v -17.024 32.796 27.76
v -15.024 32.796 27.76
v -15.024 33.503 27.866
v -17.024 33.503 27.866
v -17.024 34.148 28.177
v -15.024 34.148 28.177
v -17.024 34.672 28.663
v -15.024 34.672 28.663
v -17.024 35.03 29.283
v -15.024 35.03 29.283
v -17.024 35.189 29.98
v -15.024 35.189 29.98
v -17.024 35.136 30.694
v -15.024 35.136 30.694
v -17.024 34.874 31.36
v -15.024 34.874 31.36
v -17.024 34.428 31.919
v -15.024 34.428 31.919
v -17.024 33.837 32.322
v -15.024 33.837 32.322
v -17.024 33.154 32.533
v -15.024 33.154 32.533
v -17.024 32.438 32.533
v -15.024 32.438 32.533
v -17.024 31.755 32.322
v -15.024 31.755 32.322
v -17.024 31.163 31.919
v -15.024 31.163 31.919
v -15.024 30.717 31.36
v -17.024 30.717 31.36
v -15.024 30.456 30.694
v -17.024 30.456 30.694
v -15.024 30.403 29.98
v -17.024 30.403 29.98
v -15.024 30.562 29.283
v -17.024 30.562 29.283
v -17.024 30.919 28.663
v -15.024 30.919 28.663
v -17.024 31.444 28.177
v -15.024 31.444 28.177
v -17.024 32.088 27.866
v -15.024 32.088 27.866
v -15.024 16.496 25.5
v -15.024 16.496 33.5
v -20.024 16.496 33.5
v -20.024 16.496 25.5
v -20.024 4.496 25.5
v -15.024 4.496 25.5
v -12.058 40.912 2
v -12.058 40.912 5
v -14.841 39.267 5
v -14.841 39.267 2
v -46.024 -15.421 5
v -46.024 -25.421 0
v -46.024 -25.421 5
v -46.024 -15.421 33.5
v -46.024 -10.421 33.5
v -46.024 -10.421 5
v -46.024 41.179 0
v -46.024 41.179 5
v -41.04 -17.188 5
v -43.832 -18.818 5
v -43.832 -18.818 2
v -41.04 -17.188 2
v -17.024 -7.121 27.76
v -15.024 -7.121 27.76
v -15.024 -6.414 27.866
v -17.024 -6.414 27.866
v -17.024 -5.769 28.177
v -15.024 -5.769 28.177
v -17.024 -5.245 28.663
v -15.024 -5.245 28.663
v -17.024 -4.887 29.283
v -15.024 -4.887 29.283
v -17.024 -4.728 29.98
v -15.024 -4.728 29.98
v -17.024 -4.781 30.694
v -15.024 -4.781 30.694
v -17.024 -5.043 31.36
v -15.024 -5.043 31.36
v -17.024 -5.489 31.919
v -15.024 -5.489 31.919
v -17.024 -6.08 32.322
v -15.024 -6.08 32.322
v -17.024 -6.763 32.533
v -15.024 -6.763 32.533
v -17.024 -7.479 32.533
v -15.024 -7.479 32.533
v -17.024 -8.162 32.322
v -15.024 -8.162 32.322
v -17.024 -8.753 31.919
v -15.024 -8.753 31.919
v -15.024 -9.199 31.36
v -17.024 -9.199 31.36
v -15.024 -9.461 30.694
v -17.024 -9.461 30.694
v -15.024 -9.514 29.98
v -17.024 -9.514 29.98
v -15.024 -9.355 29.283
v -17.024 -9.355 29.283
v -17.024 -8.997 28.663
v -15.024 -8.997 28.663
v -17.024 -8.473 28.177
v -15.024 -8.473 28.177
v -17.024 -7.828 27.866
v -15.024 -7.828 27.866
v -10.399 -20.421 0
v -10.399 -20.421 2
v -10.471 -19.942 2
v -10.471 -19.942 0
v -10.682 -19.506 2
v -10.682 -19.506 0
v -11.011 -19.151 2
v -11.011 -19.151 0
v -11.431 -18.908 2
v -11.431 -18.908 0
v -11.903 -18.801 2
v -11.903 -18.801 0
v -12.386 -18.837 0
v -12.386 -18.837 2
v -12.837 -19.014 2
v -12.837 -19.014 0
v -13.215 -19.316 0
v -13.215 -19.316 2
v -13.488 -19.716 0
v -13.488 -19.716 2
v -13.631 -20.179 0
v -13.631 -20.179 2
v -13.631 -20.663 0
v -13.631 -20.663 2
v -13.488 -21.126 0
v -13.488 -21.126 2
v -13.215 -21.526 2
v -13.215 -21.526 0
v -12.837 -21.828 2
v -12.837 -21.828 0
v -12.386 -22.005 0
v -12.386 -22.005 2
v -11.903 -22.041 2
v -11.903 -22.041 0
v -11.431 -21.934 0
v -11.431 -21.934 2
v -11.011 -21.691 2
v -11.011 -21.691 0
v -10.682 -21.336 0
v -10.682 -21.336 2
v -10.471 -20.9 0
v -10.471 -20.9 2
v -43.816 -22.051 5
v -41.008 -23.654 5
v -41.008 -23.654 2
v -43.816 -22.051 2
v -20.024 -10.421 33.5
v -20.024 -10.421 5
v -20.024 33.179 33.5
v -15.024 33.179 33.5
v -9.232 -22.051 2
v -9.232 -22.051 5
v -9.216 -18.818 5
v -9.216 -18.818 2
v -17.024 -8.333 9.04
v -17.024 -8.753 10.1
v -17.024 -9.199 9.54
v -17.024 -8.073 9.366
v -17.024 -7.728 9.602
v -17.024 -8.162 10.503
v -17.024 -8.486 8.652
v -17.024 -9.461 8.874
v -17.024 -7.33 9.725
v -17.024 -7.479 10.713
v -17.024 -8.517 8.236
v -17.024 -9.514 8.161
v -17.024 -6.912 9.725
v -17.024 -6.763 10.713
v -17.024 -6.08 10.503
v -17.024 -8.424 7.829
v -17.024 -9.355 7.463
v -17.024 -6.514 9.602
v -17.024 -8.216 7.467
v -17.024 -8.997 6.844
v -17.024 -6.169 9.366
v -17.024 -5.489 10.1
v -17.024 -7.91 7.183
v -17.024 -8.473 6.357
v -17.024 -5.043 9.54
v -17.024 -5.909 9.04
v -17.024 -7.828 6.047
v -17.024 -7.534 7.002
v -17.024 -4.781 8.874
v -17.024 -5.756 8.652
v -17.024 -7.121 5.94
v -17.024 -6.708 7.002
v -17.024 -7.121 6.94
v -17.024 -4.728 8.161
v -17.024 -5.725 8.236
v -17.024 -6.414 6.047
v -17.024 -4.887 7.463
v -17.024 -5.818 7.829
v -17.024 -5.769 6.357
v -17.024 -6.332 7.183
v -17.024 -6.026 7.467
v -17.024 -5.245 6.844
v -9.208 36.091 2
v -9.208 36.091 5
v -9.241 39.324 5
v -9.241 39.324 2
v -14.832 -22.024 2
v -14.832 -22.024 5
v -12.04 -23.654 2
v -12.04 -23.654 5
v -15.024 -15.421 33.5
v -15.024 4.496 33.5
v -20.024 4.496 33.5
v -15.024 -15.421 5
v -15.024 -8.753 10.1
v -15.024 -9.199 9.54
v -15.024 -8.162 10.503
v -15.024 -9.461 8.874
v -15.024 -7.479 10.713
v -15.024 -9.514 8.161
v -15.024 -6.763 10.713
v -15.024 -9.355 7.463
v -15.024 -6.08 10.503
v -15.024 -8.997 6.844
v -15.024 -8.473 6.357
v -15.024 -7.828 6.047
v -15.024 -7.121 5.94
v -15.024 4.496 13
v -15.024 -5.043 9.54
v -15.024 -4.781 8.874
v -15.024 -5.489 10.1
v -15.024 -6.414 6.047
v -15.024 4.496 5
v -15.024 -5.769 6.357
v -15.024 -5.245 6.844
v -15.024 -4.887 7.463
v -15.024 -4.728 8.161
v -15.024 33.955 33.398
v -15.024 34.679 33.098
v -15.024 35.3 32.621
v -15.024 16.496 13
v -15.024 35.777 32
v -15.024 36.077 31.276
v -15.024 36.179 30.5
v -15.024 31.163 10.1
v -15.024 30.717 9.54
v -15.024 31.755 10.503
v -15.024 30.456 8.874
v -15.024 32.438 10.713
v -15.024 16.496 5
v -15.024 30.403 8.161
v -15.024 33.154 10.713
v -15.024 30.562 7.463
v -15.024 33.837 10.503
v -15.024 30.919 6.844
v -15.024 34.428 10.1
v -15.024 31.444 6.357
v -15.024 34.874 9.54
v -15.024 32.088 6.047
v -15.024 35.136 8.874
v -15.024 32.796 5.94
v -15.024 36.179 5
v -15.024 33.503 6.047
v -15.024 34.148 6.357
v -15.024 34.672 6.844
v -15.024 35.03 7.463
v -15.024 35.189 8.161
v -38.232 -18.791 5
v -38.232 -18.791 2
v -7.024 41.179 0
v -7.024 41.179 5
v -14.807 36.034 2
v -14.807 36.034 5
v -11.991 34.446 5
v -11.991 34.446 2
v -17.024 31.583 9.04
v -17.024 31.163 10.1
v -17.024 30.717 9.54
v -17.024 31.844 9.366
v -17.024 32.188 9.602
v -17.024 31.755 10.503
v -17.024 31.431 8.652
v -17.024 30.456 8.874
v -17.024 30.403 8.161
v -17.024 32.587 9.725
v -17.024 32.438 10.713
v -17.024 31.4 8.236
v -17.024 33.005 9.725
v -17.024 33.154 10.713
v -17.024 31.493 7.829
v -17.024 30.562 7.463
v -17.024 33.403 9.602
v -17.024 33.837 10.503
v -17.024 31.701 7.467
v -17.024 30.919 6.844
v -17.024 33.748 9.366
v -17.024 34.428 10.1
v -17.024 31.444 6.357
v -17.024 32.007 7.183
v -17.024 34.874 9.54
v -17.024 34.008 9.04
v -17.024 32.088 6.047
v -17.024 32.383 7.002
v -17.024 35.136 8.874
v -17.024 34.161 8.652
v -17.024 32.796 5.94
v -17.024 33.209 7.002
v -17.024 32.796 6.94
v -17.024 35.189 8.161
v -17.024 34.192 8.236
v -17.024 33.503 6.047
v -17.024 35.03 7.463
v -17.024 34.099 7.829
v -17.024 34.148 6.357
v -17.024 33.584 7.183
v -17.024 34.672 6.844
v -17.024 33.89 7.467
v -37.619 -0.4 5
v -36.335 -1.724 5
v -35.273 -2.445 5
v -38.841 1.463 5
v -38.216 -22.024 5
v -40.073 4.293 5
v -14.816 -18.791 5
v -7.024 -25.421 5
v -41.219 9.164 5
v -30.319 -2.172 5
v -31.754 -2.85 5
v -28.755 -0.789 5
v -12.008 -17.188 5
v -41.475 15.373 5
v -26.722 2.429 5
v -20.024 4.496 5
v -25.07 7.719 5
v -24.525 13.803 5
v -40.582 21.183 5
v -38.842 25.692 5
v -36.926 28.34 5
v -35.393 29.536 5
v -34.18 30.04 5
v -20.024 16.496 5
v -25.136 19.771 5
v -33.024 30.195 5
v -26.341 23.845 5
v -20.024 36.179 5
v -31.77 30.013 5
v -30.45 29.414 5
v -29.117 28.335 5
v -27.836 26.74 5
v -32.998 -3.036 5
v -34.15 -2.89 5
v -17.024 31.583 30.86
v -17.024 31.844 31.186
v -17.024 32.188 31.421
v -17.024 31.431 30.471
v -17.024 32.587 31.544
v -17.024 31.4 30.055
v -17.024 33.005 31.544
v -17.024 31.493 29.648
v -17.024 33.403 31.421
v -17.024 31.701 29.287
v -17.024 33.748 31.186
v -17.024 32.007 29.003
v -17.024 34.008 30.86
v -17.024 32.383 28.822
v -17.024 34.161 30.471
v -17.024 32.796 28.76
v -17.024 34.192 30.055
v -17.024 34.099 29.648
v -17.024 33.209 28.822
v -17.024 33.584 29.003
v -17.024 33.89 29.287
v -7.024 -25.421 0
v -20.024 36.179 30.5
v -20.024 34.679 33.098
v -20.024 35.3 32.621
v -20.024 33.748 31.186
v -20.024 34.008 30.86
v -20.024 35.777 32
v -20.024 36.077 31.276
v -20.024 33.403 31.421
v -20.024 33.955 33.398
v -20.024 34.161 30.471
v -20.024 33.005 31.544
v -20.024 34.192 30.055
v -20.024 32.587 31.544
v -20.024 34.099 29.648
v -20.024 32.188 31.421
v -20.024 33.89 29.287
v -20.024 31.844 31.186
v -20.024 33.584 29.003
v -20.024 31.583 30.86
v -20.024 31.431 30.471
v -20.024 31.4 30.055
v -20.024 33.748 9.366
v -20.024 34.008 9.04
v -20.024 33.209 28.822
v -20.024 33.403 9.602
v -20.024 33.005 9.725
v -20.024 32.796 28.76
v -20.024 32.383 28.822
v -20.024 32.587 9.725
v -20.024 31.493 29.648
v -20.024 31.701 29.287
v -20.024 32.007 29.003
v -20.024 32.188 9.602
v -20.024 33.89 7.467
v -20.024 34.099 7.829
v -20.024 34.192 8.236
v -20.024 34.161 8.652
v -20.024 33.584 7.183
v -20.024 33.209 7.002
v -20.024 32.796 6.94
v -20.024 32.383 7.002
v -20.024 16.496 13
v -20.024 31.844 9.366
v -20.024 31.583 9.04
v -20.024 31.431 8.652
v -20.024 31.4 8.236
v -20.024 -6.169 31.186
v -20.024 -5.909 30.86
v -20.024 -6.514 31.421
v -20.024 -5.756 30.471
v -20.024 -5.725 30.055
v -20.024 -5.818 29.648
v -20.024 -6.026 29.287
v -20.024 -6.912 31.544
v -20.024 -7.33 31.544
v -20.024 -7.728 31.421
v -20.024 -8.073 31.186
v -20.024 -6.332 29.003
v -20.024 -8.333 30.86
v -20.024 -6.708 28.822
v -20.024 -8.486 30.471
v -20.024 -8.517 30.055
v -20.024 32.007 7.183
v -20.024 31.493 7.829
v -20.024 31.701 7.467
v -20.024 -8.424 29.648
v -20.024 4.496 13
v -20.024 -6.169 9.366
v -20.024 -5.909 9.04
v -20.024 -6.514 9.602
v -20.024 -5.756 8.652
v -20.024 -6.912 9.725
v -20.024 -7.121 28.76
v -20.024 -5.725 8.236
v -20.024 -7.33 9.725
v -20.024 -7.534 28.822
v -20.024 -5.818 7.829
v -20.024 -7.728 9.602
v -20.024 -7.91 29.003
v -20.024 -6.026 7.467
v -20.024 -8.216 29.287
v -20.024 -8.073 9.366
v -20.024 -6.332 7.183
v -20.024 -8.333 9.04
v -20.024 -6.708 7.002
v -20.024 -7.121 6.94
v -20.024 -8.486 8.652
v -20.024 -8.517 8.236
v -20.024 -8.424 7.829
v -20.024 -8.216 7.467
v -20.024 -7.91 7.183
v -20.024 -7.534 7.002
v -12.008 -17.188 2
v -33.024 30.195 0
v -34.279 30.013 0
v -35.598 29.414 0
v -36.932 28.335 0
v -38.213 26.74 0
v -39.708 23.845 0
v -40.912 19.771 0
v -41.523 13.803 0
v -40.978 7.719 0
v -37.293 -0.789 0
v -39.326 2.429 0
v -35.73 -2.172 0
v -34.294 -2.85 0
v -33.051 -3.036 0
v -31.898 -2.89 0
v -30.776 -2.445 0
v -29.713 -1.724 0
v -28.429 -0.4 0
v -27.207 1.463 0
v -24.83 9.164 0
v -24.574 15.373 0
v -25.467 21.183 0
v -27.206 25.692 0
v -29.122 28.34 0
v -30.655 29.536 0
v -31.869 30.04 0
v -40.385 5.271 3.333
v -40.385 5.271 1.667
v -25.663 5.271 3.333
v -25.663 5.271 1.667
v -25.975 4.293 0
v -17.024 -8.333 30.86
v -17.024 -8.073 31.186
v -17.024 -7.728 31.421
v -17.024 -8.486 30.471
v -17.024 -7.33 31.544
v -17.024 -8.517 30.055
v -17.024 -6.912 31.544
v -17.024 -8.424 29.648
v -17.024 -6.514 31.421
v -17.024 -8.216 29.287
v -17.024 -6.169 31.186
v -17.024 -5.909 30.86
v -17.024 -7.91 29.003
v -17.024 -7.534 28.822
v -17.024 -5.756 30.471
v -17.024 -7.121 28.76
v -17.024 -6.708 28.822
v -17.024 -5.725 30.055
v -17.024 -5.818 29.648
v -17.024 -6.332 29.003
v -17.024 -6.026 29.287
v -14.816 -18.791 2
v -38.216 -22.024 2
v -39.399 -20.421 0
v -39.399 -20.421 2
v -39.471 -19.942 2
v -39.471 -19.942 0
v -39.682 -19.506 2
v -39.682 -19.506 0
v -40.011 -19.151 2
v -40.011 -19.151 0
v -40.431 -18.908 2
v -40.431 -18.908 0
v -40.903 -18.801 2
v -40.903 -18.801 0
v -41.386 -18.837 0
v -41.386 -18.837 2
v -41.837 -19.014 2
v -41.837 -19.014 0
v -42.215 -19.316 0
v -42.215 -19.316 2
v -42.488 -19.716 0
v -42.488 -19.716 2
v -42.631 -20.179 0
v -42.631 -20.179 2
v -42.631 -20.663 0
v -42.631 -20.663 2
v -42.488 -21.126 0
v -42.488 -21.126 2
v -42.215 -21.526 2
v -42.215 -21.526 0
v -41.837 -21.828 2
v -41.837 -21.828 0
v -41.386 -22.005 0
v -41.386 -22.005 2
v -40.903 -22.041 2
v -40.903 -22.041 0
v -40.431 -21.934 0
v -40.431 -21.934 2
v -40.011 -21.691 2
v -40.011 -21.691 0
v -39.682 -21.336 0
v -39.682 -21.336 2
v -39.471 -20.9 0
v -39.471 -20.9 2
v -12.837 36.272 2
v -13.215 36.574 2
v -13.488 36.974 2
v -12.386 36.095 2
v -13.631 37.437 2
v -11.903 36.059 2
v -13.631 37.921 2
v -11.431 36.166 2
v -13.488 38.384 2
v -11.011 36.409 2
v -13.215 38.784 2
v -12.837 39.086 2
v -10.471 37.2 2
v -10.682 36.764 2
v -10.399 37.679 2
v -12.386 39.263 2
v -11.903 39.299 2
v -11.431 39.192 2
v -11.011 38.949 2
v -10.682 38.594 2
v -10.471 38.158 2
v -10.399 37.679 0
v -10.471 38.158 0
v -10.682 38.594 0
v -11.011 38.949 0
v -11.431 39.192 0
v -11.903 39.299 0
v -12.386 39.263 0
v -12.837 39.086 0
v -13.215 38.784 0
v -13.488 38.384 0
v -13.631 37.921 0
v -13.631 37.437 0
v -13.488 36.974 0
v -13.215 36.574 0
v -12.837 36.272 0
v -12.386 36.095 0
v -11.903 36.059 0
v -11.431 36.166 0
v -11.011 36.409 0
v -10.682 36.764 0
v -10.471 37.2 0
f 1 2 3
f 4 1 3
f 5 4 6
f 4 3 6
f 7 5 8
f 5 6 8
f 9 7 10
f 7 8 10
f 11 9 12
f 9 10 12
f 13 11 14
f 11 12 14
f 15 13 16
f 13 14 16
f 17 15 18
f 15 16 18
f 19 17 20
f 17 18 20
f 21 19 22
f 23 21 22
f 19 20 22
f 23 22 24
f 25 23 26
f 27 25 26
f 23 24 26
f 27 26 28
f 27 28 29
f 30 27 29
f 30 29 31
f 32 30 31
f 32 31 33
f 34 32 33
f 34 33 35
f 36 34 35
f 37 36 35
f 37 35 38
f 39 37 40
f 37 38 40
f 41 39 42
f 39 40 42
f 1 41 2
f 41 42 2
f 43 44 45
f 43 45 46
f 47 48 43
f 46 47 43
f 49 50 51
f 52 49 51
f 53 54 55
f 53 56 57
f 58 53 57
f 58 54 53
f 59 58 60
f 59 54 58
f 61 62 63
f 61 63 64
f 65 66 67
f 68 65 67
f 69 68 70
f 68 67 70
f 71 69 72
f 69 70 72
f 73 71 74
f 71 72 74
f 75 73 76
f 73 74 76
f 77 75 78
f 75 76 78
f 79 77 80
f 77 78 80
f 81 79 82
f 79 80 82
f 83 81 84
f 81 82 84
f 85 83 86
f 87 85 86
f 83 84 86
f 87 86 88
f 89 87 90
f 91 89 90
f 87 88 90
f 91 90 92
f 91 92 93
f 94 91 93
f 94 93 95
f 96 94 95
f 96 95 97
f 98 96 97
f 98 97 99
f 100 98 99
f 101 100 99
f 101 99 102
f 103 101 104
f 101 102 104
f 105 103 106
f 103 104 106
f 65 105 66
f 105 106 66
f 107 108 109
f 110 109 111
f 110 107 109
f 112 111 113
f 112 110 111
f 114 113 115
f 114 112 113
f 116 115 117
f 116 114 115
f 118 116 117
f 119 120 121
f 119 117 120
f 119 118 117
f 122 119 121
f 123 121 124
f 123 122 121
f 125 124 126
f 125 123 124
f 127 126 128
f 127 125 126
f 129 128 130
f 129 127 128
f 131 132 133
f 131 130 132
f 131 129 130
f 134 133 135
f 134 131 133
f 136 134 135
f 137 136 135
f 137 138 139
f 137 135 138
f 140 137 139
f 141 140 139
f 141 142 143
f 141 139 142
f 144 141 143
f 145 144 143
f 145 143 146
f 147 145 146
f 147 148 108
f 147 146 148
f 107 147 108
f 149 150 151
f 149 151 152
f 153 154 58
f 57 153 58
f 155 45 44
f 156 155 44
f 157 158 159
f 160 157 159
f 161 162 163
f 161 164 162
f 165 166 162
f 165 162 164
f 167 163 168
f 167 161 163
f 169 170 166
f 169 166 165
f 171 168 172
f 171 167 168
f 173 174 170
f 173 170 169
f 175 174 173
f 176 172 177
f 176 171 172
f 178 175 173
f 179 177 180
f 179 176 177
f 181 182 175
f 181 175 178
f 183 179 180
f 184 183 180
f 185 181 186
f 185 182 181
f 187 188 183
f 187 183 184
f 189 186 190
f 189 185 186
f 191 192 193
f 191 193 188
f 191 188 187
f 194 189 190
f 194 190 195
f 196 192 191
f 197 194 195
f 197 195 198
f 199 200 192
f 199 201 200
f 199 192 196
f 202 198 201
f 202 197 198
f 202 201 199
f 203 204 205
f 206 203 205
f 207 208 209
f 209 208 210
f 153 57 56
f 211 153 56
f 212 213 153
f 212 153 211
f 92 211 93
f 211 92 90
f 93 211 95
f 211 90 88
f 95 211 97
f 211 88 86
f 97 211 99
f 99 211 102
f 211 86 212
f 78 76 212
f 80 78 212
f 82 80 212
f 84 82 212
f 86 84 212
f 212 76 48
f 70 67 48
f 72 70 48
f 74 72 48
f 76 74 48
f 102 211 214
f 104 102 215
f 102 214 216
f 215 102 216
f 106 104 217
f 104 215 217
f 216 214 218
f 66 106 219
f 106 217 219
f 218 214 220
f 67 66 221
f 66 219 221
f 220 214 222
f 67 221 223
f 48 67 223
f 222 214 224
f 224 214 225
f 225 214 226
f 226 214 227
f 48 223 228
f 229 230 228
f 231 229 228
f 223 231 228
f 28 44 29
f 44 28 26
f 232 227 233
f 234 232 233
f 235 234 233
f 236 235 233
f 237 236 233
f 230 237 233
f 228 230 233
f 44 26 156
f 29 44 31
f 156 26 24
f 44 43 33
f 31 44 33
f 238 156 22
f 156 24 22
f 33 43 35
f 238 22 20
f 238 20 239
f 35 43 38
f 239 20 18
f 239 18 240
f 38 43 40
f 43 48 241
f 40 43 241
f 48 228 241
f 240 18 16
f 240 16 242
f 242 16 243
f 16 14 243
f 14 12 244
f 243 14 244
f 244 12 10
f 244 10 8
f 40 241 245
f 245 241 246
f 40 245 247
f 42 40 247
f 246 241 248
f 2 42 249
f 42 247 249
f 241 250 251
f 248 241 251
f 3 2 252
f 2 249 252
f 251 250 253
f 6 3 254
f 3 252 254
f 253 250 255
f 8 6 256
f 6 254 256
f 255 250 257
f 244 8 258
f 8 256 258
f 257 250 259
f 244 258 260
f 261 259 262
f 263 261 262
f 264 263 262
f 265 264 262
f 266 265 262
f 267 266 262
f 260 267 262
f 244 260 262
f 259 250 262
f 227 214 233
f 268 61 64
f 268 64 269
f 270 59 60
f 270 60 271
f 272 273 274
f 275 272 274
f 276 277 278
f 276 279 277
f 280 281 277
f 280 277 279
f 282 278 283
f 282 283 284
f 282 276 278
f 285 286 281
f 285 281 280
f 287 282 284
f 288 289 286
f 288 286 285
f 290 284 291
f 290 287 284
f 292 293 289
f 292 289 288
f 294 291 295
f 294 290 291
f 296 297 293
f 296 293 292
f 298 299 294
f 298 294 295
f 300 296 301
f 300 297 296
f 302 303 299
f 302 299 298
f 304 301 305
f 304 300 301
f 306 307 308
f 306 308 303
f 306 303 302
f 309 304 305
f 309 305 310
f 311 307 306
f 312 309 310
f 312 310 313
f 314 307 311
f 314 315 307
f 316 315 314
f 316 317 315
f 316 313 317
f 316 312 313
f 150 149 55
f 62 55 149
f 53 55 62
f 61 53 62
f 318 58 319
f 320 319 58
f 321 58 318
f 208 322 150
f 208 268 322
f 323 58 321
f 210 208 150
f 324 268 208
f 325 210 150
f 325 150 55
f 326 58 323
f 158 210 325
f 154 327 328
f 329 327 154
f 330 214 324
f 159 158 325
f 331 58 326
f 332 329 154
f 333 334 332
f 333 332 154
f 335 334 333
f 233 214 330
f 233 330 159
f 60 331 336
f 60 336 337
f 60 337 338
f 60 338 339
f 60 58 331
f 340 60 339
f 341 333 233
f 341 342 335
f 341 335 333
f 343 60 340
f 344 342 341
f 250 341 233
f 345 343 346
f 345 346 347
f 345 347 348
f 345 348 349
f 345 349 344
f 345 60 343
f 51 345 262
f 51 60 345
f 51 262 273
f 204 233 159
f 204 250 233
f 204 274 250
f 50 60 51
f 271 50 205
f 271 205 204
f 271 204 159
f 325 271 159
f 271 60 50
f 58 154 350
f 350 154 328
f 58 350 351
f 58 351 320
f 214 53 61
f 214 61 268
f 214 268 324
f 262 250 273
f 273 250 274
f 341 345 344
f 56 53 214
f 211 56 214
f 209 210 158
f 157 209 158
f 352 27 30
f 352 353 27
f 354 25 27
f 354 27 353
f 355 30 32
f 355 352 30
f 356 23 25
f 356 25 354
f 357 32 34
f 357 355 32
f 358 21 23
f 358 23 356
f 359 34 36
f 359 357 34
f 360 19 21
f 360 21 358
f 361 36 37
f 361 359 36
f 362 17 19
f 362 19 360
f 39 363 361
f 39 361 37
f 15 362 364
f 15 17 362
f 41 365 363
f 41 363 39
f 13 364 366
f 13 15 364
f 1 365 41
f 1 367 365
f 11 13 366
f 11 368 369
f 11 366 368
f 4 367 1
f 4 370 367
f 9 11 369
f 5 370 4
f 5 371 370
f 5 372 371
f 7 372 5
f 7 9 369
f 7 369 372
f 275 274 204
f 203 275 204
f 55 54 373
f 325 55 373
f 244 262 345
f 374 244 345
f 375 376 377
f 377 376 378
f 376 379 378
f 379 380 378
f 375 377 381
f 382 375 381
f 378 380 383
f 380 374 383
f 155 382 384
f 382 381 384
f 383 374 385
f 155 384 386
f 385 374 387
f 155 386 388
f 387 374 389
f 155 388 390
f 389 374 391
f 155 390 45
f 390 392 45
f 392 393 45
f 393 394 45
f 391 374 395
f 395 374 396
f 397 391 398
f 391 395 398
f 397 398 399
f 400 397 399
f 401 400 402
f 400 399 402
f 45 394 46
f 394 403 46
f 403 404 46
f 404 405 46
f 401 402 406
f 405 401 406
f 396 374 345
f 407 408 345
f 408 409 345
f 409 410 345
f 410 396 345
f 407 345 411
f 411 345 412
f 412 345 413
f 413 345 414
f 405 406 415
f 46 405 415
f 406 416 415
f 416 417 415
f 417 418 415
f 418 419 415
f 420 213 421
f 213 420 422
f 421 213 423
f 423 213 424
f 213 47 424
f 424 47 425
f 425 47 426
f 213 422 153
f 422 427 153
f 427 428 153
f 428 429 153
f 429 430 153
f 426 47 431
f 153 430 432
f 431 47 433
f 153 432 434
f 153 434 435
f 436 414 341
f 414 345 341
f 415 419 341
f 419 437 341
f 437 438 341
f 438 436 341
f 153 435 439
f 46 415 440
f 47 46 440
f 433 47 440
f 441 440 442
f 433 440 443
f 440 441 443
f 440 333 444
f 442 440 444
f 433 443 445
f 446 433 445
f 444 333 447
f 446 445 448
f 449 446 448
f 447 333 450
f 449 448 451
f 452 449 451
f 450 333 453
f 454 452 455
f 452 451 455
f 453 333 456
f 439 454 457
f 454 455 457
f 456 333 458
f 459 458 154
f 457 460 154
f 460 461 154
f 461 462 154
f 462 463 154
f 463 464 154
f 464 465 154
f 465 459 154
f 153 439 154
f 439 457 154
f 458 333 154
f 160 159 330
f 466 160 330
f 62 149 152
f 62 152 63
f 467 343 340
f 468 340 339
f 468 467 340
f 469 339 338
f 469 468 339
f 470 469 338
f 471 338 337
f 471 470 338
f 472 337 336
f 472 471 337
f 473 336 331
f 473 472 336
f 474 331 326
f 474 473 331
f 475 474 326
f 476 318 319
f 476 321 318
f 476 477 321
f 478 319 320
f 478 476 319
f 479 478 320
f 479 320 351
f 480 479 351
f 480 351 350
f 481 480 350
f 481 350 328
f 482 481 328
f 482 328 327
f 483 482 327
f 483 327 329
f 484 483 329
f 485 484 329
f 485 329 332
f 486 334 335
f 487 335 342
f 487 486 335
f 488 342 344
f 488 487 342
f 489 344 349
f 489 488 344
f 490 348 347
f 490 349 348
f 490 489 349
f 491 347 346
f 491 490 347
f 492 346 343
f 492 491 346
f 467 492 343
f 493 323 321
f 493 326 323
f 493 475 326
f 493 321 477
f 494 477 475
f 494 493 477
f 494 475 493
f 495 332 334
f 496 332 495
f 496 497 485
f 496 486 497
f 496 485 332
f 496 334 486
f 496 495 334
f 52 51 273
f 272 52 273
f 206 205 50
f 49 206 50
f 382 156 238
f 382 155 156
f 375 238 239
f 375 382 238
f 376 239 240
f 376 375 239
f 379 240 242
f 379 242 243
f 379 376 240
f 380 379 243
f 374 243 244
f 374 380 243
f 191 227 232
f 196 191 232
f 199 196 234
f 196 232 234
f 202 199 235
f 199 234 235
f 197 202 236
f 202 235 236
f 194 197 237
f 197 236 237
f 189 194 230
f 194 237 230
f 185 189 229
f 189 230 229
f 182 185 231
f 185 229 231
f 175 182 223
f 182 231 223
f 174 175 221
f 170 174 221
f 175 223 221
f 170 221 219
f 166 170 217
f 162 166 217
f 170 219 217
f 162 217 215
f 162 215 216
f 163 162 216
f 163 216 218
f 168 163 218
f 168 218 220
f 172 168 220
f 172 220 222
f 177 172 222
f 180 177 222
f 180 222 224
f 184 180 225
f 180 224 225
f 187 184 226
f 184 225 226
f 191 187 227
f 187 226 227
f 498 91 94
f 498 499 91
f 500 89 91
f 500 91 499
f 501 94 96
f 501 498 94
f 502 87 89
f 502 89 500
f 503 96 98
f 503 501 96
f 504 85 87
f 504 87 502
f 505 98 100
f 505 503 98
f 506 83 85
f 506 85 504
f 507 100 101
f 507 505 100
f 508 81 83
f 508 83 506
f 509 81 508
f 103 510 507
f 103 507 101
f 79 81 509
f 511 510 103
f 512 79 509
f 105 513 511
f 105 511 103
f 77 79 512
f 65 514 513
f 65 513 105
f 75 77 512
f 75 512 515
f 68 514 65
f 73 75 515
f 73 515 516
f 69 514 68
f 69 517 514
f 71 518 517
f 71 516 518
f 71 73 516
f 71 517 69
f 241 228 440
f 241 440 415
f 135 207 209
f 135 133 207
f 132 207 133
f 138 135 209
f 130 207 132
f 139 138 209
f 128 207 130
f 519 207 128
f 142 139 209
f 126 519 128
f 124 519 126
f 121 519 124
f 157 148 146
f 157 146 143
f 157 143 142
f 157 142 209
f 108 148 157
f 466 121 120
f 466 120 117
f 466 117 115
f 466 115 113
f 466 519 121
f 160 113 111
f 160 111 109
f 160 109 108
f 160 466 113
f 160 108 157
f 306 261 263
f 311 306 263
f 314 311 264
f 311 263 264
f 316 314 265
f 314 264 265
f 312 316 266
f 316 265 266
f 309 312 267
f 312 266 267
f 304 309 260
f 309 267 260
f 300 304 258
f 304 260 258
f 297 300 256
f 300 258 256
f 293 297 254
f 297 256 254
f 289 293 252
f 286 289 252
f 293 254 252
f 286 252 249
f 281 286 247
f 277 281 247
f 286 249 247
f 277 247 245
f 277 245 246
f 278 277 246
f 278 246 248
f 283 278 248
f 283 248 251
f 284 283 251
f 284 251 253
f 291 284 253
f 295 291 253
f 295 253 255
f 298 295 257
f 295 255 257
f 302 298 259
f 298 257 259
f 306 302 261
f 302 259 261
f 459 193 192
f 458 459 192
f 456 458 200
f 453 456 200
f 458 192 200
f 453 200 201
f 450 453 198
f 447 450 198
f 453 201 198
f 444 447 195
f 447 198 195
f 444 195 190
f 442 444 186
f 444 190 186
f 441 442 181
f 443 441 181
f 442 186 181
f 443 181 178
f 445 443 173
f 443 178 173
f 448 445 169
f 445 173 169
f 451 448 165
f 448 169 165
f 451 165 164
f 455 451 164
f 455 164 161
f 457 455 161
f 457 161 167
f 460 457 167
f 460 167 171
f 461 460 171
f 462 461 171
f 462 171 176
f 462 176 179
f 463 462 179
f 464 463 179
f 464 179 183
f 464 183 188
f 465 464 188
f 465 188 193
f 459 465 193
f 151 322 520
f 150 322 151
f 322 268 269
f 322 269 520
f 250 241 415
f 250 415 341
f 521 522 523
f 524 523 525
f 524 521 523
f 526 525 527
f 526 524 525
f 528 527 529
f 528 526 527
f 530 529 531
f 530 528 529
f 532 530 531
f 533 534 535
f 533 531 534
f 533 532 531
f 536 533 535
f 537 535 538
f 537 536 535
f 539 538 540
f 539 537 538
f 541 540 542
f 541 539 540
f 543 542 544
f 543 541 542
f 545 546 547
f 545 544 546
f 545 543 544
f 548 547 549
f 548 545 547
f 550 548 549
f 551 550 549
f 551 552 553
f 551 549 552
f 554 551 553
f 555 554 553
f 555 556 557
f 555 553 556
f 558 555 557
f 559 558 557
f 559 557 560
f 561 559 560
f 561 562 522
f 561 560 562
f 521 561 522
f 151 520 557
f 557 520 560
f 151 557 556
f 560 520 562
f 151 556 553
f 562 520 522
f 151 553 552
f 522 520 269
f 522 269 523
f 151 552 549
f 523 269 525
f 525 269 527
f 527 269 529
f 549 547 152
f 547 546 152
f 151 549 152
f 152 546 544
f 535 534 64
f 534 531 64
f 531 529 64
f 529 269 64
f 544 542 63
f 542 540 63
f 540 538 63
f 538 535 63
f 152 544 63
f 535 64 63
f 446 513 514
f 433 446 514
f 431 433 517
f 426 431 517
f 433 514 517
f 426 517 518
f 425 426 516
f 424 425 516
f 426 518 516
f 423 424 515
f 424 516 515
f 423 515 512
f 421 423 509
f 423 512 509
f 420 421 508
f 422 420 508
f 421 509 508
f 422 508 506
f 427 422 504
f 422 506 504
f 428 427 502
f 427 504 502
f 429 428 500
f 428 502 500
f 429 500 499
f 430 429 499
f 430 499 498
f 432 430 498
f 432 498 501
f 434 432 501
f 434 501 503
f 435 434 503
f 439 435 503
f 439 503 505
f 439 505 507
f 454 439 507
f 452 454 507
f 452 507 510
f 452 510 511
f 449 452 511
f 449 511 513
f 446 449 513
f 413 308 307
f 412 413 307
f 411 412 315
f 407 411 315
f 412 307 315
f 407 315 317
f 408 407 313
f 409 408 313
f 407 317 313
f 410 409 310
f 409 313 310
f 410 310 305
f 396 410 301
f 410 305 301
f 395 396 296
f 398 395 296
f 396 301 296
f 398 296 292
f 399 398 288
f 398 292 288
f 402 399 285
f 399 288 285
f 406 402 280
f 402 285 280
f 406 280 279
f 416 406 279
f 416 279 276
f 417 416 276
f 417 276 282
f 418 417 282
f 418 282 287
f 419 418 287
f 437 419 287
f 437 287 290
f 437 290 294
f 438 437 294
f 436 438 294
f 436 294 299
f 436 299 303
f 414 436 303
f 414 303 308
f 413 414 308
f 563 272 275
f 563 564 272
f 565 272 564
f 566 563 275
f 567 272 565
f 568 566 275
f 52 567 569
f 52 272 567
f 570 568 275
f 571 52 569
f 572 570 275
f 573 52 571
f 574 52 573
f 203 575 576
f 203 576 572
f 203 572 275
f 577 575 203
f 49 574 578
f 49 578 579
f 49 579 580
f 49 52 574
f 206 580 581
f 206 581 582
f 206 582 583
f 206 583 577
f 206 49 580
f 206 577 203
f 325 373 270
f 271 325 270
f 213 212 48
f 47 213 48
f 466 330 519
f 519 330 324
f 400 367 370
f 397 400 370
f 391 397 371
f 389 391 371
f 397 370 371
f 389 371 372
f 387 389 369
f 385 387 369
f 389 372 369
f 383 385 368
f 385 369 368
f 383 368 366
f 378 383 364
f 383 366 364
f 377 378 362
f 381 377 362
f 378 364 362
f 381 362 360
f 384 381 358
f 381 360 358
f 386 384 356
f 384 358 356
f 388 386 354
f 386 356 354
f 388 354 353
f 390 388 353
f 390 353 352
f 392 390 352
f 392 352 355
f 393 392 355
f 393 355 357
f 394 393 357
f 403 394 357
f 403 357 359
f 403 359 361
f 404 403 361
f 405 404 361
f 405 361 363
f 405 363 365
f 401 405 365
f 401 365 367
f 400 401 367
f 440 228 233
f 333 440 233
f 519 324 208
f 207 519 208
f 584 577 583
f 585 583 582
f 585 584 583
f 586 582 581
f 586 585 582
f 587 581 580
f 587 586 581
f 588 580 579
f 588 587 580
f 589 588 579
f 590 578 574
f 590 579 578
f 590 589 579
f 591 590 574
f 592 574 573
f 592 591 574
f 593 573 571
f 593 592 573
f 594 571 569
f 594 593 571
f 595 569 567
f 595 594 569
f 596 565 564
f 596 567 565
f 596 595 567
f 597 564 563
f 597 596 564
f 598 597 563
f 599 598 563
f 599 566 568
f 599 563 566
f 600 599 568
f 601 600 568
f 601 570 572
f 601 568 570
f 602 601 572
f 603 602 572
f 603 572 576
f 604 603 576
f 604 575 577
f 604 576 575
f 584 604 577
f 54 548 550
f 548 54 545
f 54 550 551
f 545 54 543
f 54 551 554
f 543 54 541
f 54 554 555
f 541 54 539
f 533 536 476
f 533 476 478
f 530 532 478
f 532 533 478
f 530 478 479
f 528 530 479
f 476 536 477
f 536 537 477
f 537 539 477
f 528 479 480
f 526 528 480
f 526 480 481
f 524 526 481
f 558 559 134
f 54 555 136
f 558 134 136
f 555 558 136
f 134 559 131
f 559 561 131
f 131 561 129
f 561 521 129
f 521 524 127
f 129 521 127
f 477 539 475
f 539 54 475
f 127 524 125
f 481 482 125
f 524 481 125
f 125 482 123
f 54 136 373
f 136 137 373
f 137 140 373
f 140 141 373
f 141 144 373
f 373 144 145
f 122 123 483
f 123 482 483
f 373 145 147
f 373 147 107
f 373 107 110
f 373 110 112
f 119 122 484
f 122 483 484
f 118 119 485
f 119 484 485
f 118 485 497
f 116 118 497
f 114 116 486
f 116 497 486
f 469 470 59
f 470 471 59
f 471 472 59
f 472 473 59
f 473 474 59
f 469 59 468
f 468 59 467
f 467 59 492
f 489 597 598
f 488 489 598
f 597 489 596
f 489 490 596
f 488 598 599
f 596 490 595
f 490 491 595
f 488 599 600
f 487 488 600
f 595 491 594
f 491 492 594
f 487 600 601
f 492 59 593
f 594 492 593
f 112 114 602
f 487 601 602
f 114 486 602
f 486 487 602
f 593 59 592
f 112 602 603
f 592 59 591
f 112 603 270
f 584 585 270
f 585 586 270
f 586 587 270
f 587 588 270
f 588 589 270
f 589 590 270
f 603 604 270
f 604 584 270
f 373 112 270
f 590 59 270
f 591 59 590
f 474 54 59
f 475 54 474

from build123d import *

# Parameters (mm, degrees)
SKETCH1_W           = 39
SKETCH1_H           = 66.6
SKETCH1_R           = 1.625
BOSS_EXTRUDE1_DEPTH = 5
BOSS_EXTRUDE3_DEPTH = 33.5
CUT_EXTRUDE5_START  = 5
CUT_EXTRUDE5_DEPTH  = 3
FILLET1_R           = 3
SKETCH3_R           = 1.4
SKETCH3_W           = 8
SKETCH3_H           = 12
CUT_EXTRUDE6_DEPTH  = 62.473243338
SKETCH3_3_R         = 2.4
SKETCH3_3_R_2       = 1.4
CUT_EXTRUDE7_DEPTH  = 2


with BuildPart() as part:
    # Sketch1 → Boss-Extrude1 (new body)
    with BuildSketch(Plane.XY):
        with Locations((-26.524184287, 7.878995035)):
            Rectangle(SKETCH1_W, SKETCH1_H)
        with Locations((-12.024184287, -20.421004965)):
            Circle(SKETCH1_R, mode=Mode.SUBTRACT)
        with BuildLine():
            add(Edge.make_bspline(
                [(-33.024184287, 30.194508602), (-47.746616151, 30.194508602), (-40.385400219, 5.271238252), (-33.024184287, -19.652032099), (-25.662968354, 5.271238252), (-18.301752422, 30.194508602), (-33.024184287, 30.194508602)],
                knots=[0, 0, 0, 2.094395102, 2.094395102, 4.188790205, 4.188790205, 6.283185307, 6.283185307, 6.283185307], degree=2, weights=[1, 0.5, 1, 0.5, 1, 0.5, 1]))
        make_face(mode=Mode.SUBTRACT)
        with Locations((-12.024184287, 37.678995035)):
            Circle(SKETCH1_R, mode=Mode.SUBTRACT)
        with Locations((-41.024184287, -20.421004965)):
            Circle(SKETCH1_R, mode=Mode.SUBTRACT)
    extrude(amount=BOSS_EXTRUDE1_DEPTH)

    # Sketch1<3> → Boss-Extrude3 (add)
    with BuildSketch(Plane.XY):
        Polygon((-20.024184287, -10.421004965), (-46.024184287, -10.421004965), (-46.024184287, -12.421004965), (-46.024184287, -15.421004965), (-15.024184287, -15.421004965), (-15.024184287, 36.178995035), (-20.024184287, 36.178995035), align=None)
    extrude(amount=BOSS_EXTRUDE3_DEPTH)

    # Sketch1<6> → Cut-Extrude5 (cut)
    with BuildSketch(Plane.XY.offset(CUT_EXTRUDE5_START)):
        Polygon((-41.008426388, -23.654128071), (-43.816272081, -22.051213259), (-43.83202998, -18.818090152), (-41.039942185, -17.187881858), (-38.232096492, -18.790796671), (-38.216338594, -22.023919778), align=None)
        Polygon((-14.840760077, 39.266519571), (-14.807308759, 36.033531117), (-11.990732969, 34.446006581), (-9.207608497, 36.091470499), (-9.241059814, 39.324458953), (-12.057635604, 40.911983489), align=None)
        Polygon((-9.232096492, -22.051213259), (-9.216338594, -18.818090152), (-12.008426388, -17.187881858), (-14.816272081, -18.790796671), (-14.83202998, -22.023919778), (-12.039942185, -23.654128071), align=None)
    extrude(amount=-CUT_EXTRUDE5_DEPTH, mode=Mode.SUBTRACT)

    # Fillet1
    fillet1_edges = [part.edges().sort_by_distance(p)[0] for p in [
        (-17.524184287, 36.178995035, 33.5),
    ]]
    fillet(fillet1_edges, radius=FILLET1_R)

    # Sketch3 → Cut-Extrude6 (cut, through all)
    with BuildSketch(Plane(origin=(-15.024184287, 0, 0), x_dir=(0, 0, -1), z_dir=(1, 0, 0))):
        with Locations((-30.15981065, 32.795843126)):
            Circle(SKETCH3_R)
        with Locations((-8.34018935, 32.795843126)):
            Circle(SKETCH3_R)
        with Locations((-8.34018935, -7.121004965)):
            Circle(SKETCH3_R)
        with Locations((-30.15981065, -7.121004965)):
            Circle(SKETCH3_R)
        with Locations((-29.5, 10.495843125)):
            Rectangle(SKETCH3_W, SKETCH3_H)
        with Locations((-9, 10.495843125)):
            Rectangle(SKETCH3_W, SKETCH3_H)
    extrude(amount=-CUT_EXTRUDE6_DEPTH, mode=Mode.SUBTRACT)

    # Sketch3<3> → Cut-Extrude7 (cut)
    # profile 1 of 4: a face of its own
    with BuildSketch(Plane(origin=(-15.024184287, 0, 0), x_dir=(0, 0, -1), z_dir=(1, 0, 0))):
        with Locations((-8.34018935, 32.795843126)):
            Circle(SKETCH3_3_R)
        with Locations((-8.34018935, 32.795843126)):
            Circle(SKETCH3_3_R_2, mode=Mode.SUBTRACT)
    # profile 2 of 4: a face of its own
    with BuildSketch(Plane(origin=(-15.024184287, 0, 0), x_dir=(0, 0, -1), z_dir=(1, 0, 0))):
        with Locations((-30.15981065, 32.795843126)):
            Circle(SKETCH3_3_R)
        with Locations((-30.15981065, 32.795843126)):
            Circle(SKETCH3_3_R_2, mode=Mode.SUBTRACT)
    # profile 3 of 4: a face of its own
    with BuildSketch(Plane(origin=(-15.024184287, 0, 0), x_dir=(0, 0, -1), z_dir=(1, 0, 0))):
        with Locations((-30.15981065, -7.121004965)):
            Circle(SKETCH3_3_R)
        with Locations((-30.15981065, -7.121004965)):
            Circle(SKETCH3_3_R_2, mode=Mode.SUBTRACT)
    # profile 4 of 4: a face of its own
    with BuildSketch(Plane(origin=(-15.024184287, 0, 0), x_dir=(0, 0, -1), z_dir=(1, 0, 0))):
        with Locations((-8.34018935, -7.121004965)):
            Circle(SKETCH3_3_R)
        with Locations((-8.34018935, -7.121004965)):
            Circle(SKETCH3_3_R_2, mode=Mode.SUBTRACT)
    extrude(amount=-CUT_EXTRUDE7_DEPTH, mode=Mode.SUBTRACT)


solid = part.part
